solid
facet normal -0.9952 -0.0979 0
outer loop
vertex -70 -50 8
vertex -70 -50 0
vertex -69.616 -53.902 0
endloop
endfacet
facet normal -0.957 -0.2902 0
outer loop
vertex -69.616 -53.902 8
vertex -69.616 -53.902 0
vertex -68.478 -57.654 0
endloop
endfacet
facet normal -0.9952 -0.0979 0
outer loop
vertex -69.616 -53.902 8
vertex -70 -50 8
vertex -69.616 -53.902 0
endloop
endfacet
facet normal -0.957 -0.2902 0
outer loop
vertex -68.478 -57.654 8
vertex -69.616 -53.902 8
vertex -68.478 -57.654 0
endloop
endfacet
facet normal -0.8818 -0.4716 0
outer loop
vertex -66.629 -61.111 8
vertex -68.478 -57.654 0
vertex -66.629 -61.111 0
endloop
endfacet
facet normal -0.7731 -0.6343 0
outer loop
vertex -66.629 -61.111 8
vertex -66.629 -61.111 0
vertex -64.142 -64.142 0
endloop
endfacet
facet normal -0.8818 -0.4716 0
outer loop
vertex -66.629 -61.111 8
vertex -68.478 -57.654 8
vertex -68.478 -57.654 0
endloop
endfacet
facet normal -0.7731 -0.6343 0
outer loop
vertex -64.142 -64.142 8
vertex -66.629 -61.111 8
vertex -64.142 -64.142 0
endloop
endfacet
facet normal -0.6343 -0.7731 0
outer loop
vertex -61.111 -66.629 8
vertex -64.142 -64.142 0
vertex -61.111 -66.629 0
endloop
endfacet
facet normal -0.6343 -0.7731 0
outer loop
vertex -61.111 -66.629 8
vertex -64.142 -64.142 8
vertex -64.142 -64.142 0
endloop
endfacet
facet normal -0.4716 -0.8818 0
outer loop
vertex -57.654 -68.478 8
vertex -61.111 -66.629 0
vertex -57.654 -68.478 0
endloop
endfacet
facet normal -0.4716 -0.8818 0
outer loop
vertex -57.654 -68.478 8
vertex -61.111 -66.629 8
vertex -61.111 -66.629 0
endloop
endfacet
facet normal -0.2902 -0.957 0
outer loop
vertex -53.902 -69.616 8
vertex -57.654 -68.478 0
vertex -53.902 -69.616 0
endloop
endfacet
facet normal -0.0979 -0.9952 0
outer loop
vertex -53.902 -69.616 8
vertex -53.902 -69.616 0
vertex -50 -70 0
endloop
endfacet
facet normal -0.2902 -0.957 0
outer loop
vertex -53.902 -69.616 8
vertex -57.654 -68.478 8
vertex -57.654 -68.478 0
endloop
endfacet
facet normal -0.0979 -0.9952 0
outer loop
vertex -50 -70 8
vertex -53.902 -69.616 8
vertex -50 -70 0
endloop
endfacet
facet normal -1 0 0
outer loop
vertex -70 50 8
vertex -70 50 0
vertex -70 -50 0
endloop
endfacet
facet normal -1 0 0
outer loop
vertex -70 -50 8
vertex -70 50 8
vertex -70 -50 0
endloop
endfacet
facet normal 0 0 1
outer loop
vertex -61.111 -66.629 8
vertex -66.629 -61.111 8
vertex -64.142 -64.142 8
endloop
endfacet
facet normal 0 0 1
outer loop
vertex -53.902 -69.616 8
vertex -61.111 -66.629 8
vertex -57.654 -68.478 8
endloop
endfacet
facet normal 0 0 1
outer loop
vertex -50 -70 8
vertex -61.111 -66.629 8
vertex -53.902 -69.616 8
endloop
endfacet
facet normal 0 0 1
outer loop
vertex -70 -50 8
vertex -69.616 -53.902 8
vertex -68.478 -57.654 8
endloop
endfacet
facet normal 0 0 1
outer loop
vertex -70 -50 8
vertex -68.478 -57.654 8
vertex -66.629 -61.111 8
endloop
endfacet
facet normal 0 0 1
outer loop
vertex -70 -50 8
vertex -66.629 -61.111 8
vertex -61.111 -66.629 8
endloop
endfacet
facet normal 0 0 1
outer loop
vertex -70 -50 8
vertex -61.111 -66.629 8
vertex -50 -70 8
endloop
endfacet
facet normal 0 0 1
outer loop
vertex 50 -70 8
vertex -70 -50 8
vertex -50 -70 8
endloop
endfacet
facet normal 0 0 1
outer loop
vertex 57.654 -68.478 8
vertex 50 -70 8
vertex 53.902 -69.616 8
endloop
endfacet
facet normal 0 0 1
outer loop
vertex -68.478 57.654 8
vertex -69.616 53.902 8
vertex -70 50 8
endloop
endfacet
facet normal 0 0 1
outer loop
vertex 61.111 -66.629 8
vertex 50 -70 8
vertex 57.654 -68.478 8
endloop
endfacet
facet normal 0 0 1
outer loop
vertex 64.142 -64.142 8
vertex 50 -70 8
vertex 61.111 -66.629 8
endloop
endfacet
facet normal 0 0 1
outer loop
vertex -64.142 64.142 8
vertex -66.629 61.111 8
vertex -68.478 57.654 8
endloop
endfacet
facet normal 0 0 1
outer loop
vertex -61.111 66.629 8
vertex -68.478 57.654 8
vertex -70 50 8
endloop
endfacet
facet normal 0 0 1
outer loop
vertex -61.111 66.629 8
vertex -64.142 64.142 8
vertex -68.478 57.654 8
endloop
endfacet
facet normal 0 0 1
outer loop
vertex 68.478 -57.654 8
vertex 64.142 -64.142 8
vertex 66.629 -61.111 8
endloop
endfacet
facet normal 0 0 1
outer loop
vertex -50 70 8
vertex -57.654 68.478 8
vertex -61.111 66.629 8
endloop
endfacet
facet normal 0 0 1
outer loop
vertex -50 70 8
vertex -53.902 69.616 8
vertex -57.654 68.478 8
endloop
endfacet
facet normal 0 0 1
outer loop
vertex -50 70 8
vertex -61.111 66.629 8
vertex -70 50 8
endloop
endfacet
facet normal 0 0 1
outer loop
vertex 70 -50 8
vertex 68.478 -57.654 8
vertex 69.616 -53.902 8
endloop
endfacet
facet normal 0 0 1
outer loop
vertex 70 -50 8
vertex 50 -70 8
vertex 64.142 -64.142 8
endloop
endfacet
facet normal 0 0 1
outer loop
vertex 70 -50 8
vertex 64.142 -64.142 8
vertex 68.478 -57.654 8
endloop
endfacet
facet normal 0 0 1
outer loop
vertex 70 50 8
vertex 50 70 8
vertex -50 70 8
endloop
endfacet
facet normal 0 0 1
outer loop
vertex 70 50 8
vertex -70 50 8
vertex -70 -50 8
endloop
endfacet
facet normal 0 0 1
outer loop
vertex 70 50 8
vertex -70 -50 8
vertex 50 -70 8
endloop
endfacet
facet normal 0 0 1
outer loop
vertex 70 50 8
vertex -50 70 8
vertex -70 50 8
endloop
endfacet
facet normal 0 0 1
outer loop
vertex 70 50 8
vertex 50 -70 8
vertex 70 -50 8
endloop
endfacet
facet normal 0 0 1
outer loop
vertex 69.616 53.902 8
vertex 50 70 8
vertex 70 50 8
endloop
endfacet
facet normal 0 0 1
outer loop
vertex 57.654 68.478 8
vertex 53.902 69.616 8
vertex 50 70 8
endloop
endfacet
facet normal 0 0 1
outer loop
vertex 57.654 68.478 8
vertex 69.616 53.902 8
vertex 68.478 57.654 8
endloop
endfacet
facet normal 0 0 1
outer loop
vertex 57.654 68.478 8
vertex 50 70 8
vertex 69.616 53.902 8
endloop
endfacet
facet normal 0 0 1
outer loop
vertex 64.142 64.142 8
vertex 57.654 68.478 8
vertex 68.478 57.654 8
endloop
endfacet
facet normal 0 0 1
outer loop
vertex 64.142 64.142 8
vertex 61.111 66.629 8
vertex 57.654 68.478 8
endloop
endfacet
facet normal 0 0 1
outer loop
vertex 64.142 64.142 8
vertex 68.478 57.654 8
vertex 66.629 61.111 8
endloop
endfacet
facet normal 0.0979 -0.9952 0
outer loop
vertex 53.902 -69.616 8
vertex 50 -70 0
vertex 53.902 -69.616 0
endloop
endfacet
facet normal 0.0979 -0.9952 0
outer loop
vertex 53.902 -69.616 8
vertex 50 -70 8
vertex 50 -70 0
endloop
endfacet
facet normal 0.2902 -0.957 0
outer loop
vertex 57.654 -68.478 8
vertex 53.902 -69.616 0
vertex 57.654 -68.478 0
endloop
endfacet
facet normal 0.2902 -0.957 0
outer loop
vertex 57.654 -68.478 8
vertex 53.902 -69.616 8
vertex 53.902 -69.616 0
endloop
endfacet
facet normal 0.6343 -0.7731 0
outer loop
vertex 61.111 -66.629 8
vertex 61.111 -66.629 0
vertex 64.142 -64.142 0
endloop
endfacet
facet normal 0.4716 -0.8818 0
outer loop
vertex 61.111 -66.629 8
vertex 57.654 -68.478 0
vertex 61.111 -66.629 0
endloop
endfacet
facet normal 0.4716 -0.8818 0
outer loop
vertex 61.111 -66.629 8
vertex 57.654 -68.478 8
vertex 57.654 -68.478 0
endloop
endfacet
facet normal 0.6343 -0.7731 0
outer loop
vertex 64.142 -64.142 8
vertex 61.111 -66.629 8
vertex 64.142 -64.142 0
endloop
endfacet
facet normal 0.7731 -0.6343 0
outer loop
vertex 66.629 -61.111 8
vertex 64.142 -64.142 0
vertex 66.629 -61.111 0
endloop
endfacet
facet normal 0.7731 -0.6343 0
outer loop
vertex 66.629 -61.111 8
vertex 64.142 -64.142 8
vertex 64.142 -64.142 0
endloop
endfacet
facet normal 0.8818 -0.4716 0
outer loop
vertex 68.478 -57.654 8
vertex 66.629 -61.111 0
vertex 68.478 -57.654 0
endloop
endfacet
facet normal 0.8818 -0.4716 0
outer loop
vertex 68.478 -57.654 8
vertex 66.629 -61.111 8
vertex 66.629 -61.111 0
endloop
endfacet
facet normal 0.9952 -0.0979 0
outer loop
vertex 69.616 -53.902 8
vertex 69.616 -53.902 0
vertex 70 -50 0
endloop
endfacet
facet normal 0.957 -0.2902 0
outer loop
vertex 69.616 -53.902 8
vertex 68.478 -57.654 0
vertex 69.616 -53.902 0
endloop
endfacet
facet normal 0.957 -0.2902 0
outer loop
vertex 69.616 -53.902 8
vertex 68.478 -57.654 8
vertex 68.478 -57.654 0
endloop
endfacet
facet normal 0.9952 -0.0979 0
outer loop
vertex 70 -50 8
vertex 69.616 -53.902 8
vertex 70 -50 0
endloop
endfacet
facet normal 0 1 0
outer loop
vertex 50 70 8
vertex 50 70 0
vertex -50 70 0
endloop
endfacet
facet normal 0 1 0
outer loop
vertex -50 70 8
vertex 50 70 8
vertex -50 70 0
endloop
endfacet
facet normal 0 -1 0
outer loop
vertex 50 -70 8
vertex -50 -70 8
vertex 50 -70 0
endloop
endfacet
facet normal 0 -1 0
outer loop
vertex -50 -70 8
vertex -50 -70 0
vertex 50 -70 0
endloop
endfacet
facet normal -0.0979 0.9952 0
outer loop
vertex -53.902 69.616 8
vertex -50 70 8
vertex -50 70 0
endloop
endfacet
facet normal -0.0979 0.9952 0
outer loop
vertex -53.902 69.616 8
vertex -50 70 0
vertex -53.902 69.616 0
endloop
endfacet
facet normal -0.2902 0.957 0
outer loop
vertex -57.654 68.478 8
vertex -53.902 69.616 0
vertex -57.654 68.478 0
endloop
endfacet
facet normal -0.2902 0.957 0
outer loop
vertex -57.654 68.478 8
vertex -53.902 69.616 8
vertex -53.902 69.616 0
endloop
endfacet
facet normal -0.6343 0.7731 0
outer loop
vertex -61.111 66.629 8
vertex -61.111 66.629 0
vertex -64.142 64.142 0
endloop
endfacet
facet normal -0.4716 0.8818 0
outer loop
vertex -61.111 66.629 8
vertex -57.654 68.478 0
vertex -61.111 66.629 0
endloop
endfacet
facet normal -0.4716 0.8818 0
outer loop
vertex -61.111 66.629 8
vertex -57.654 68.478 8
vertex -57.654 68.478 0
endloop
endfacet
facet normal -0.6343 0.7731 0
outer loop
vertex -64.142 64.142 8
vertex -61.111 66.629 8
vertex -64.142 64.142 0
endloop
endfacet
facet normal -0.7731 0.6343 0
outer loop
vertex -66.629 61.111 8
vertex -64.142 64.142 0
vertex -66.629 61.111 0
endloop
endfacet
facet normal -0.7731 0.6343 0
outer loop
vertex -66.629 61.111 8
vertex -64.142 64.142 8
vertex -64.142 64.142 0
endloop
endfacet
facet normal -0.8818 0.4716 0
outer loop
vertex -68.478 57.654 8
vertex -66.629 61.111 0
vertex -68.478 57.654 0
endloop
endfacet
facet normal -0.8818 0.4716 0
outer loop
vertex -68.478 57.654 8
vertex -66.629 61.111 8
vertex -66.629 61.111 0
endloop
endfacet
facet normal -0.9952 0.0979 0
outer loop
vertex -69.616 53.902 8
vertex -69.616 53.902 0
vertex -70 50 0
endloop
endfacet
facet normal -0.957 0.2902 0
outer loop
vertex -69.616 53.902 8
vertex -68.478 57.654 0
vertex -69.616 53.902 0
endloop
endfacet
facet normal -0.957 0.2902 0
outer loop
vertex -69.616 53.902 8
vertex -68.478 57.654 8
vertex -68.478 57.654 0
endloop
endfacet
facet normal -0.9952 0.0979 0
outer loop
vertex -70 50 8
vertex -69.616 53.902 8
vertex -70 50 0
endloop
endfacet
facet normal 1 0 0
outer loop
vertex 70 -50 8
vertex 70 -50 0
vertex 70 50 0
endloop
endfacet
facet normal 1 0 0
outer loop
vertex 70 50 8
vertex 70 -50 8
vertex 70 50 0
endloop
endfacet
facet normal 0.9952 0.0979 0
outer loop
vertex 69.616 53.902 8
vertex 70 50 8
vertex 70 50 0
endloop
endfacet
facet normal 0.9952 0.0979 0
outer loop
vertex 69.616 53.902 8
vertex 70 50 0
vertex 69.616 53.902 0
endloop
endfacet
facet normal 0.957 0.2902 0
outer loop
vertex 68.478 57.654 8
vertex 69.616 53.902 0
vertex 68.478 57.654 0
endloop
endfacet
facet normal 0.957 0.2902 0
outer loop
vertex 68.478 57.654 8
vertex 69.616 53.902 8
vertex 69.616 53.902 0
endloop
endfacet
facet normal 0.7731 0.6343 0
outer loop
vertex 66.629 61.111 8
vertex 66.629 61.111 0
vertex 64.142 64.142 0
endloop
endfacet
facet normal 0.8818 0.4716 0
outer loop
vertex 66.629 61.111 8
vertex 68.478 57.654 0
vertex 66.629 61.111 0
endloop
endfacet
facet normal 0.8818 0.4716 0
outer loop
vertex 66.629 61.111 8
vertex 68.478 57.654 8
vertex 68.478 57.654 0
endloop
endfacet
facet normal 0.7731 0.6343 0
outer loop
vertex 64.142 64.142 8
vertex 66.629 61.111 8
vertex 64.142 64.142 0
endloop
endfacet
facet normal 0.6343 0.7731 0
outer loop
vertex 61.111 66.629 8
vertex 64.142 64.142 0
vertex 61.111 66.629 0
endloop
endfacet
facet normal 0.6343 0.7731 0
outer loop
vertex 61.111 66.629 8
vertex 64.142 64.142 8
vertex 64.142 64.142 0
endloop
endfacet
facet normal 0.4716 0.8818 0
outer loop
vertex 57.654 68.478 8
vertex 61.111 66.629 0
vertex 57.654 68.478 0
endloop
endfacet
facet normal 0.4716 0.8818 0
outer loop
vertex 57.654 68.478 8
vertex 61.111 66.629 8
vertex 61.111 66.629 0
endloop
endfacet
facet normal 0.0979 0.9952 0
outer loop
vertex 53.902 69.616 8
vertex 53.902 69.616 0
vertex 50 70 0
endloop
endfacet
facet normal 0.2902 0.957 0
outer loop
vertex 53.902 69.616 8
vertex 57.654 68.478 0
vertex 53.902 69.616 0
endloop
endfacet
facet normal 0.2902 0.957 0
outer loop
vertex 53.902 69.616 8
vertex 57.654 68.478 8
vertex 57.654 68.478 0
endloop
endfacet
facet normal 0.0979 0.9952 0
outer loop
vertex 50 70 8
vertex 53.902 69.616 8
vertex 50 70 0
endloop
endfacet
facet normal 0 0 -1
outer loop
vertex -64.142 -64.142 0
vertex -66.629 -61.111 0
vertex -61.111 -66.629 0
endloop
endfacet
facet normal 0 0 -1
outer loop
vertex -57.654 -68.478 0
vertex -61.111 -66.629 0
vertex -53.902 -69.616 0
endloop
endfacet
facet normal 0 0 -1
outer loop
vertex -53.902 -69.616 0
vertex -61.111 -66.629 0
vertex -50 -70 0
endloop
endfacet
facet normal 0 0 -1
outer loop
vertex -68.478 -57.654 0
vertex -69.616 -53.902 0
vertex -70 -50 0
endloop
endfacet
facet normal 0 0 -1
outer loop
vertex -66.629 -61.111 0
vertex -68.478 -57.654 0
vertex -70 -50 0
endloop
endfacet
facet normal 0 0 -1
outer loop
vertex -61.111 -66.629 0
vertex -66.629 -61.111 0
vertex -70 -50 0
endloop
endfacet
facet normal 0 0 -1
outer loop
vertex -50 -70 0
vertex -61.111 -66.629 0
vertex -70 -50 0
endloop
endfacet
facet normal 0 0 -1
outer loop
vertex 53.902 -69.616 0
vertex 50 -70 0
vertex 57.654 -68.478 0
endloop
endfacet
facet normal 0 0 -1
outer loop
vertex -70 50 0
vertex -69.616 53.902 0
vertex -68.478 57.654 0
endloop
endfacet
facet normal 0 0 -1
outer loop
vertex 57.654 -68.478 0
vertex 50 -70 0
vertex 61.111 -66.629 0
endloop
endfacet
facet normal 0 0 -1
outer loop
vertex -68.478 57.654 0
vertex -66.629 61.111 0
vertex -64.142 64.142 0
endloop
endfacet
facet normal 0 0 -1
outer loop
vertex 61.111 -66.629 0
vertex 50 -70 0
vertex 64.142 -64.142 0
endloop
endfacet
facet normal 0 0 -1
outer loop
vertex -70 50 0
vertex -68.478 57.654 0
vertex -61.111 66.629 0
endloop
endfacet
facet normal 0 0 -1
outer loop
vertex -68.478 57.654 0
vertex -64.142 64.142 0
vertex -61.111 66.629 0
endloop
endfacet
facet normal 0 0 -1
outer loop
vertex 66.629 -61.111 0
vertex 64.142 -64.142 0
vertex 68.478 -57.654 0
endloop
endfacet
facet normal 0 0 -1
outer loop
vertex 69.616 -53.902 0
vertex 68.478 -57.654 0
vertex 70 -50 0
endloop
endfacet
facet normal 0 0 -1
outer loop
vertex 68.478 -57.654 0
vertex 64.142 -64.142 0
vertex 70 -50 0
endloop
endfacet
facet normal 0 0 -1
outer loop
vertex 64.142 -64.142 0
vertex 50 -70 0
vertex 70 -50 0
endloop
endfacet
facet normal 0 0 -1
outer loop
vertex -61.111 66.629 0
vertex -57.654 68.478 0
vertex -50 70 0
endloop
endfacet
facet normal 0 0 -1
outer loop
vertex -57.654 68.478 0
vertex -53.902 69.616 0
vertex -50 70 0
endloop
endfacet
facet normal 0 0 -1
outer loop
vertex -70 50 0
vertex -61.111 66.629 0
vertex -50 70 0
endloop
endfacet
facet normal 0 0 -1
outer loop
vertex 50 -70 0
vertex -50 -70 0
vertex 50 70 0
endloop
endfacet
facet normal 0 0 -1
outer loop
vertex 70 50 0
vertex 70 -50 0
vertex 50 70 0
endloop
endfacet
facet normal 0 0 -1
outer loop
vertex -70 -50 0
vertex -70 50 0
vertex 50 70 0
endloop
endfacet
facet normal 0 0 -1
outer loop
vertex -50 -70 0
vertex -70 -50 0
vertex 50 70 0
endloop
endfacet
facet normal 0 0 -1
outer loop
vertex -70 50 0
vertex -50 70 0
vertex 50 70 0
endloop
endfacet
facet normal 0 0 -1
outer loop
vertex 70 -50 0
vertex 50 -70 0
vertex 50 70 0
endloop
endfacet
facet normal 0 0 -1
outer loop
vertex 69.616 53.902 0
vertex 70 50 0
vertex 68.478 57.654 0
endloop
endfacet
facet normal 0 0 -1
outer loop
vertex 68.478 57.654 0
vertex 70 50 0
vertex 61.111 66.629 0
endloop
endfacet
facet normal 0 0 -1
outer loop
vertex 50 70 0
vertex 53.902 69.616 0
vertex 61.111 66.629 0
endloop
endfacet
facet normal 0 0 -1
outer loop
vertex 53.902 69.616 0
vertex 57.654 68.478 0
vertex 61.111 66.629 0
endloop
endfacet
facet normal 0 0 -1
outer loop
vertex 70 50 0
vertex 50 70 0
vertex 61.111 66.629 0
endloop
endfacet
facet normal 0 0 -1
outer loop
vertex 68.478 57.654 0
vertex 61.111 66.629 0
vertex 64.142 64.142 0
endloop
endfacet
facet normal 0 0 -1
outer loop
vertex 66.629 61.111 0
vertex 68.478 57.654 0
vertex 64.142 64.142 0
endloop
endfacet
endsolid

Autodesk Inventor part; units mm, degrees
ref_plane "YZ Plane" through (0, 0, 0) normal (1, 0, 0) x (0, 1, 0)
ref_plane "XZ Plane" through (0, 0, 0) normal (0, 1, 0) x (-1, 0, 0)
ref_plane "XY Plane" through (0, 0, 0) normal (0, 0, 1) x (1, 0, 0)
sketch "Sketch1" plane through (0, 0, 0) normal (0, 0, 1) x (1, 0, 0)
  line L0 (-70, -70) -> (70, -70)
  line L1 (70, -70) -> (70, 70)
  line L2 (70, 70) -> (-70, 70)
  line L3 (-70, 70) -> (-70, -70)
  line L4 (-70, -70) -> (70, 70) construction
  line L5 (70, -70) -> (-70, 70) construction
  point P0 (0, 0)
  dimension "d0" = 140
  dimension "d1" = 140
extrude "Plate1" add sketch "Sketch1" along normal blind 8
fillet "Corner Round1" radius 20 4 edges at (70, -70, 4) (-70, -70, 4) (-70, 70, 4) (70, 70, 4)
equation "\"d0\" = d1"
equation "\"d2\" = Thickness"
equation "\"BendReliefWidth\" = Thickness"
equation "\"BendReliefDepth\" = 0.5 * Thickness"
equation "\"CornerReliefSize\" = 4 * Thickness"
equation "\"MinimumRemnant\" = 2 * Thickness"
equation "\"TransitionRadius\" = BendRadius"
equation "\"JacobiRadiusSize\" = BendRadius"
equation "\"GapSize\" = Thickness"
equation "\"Thickness\" = 8"
equation "\"BendRadius\" = 5"
properties part number "TZS 1282 leg plate for filter" material "Steel"
